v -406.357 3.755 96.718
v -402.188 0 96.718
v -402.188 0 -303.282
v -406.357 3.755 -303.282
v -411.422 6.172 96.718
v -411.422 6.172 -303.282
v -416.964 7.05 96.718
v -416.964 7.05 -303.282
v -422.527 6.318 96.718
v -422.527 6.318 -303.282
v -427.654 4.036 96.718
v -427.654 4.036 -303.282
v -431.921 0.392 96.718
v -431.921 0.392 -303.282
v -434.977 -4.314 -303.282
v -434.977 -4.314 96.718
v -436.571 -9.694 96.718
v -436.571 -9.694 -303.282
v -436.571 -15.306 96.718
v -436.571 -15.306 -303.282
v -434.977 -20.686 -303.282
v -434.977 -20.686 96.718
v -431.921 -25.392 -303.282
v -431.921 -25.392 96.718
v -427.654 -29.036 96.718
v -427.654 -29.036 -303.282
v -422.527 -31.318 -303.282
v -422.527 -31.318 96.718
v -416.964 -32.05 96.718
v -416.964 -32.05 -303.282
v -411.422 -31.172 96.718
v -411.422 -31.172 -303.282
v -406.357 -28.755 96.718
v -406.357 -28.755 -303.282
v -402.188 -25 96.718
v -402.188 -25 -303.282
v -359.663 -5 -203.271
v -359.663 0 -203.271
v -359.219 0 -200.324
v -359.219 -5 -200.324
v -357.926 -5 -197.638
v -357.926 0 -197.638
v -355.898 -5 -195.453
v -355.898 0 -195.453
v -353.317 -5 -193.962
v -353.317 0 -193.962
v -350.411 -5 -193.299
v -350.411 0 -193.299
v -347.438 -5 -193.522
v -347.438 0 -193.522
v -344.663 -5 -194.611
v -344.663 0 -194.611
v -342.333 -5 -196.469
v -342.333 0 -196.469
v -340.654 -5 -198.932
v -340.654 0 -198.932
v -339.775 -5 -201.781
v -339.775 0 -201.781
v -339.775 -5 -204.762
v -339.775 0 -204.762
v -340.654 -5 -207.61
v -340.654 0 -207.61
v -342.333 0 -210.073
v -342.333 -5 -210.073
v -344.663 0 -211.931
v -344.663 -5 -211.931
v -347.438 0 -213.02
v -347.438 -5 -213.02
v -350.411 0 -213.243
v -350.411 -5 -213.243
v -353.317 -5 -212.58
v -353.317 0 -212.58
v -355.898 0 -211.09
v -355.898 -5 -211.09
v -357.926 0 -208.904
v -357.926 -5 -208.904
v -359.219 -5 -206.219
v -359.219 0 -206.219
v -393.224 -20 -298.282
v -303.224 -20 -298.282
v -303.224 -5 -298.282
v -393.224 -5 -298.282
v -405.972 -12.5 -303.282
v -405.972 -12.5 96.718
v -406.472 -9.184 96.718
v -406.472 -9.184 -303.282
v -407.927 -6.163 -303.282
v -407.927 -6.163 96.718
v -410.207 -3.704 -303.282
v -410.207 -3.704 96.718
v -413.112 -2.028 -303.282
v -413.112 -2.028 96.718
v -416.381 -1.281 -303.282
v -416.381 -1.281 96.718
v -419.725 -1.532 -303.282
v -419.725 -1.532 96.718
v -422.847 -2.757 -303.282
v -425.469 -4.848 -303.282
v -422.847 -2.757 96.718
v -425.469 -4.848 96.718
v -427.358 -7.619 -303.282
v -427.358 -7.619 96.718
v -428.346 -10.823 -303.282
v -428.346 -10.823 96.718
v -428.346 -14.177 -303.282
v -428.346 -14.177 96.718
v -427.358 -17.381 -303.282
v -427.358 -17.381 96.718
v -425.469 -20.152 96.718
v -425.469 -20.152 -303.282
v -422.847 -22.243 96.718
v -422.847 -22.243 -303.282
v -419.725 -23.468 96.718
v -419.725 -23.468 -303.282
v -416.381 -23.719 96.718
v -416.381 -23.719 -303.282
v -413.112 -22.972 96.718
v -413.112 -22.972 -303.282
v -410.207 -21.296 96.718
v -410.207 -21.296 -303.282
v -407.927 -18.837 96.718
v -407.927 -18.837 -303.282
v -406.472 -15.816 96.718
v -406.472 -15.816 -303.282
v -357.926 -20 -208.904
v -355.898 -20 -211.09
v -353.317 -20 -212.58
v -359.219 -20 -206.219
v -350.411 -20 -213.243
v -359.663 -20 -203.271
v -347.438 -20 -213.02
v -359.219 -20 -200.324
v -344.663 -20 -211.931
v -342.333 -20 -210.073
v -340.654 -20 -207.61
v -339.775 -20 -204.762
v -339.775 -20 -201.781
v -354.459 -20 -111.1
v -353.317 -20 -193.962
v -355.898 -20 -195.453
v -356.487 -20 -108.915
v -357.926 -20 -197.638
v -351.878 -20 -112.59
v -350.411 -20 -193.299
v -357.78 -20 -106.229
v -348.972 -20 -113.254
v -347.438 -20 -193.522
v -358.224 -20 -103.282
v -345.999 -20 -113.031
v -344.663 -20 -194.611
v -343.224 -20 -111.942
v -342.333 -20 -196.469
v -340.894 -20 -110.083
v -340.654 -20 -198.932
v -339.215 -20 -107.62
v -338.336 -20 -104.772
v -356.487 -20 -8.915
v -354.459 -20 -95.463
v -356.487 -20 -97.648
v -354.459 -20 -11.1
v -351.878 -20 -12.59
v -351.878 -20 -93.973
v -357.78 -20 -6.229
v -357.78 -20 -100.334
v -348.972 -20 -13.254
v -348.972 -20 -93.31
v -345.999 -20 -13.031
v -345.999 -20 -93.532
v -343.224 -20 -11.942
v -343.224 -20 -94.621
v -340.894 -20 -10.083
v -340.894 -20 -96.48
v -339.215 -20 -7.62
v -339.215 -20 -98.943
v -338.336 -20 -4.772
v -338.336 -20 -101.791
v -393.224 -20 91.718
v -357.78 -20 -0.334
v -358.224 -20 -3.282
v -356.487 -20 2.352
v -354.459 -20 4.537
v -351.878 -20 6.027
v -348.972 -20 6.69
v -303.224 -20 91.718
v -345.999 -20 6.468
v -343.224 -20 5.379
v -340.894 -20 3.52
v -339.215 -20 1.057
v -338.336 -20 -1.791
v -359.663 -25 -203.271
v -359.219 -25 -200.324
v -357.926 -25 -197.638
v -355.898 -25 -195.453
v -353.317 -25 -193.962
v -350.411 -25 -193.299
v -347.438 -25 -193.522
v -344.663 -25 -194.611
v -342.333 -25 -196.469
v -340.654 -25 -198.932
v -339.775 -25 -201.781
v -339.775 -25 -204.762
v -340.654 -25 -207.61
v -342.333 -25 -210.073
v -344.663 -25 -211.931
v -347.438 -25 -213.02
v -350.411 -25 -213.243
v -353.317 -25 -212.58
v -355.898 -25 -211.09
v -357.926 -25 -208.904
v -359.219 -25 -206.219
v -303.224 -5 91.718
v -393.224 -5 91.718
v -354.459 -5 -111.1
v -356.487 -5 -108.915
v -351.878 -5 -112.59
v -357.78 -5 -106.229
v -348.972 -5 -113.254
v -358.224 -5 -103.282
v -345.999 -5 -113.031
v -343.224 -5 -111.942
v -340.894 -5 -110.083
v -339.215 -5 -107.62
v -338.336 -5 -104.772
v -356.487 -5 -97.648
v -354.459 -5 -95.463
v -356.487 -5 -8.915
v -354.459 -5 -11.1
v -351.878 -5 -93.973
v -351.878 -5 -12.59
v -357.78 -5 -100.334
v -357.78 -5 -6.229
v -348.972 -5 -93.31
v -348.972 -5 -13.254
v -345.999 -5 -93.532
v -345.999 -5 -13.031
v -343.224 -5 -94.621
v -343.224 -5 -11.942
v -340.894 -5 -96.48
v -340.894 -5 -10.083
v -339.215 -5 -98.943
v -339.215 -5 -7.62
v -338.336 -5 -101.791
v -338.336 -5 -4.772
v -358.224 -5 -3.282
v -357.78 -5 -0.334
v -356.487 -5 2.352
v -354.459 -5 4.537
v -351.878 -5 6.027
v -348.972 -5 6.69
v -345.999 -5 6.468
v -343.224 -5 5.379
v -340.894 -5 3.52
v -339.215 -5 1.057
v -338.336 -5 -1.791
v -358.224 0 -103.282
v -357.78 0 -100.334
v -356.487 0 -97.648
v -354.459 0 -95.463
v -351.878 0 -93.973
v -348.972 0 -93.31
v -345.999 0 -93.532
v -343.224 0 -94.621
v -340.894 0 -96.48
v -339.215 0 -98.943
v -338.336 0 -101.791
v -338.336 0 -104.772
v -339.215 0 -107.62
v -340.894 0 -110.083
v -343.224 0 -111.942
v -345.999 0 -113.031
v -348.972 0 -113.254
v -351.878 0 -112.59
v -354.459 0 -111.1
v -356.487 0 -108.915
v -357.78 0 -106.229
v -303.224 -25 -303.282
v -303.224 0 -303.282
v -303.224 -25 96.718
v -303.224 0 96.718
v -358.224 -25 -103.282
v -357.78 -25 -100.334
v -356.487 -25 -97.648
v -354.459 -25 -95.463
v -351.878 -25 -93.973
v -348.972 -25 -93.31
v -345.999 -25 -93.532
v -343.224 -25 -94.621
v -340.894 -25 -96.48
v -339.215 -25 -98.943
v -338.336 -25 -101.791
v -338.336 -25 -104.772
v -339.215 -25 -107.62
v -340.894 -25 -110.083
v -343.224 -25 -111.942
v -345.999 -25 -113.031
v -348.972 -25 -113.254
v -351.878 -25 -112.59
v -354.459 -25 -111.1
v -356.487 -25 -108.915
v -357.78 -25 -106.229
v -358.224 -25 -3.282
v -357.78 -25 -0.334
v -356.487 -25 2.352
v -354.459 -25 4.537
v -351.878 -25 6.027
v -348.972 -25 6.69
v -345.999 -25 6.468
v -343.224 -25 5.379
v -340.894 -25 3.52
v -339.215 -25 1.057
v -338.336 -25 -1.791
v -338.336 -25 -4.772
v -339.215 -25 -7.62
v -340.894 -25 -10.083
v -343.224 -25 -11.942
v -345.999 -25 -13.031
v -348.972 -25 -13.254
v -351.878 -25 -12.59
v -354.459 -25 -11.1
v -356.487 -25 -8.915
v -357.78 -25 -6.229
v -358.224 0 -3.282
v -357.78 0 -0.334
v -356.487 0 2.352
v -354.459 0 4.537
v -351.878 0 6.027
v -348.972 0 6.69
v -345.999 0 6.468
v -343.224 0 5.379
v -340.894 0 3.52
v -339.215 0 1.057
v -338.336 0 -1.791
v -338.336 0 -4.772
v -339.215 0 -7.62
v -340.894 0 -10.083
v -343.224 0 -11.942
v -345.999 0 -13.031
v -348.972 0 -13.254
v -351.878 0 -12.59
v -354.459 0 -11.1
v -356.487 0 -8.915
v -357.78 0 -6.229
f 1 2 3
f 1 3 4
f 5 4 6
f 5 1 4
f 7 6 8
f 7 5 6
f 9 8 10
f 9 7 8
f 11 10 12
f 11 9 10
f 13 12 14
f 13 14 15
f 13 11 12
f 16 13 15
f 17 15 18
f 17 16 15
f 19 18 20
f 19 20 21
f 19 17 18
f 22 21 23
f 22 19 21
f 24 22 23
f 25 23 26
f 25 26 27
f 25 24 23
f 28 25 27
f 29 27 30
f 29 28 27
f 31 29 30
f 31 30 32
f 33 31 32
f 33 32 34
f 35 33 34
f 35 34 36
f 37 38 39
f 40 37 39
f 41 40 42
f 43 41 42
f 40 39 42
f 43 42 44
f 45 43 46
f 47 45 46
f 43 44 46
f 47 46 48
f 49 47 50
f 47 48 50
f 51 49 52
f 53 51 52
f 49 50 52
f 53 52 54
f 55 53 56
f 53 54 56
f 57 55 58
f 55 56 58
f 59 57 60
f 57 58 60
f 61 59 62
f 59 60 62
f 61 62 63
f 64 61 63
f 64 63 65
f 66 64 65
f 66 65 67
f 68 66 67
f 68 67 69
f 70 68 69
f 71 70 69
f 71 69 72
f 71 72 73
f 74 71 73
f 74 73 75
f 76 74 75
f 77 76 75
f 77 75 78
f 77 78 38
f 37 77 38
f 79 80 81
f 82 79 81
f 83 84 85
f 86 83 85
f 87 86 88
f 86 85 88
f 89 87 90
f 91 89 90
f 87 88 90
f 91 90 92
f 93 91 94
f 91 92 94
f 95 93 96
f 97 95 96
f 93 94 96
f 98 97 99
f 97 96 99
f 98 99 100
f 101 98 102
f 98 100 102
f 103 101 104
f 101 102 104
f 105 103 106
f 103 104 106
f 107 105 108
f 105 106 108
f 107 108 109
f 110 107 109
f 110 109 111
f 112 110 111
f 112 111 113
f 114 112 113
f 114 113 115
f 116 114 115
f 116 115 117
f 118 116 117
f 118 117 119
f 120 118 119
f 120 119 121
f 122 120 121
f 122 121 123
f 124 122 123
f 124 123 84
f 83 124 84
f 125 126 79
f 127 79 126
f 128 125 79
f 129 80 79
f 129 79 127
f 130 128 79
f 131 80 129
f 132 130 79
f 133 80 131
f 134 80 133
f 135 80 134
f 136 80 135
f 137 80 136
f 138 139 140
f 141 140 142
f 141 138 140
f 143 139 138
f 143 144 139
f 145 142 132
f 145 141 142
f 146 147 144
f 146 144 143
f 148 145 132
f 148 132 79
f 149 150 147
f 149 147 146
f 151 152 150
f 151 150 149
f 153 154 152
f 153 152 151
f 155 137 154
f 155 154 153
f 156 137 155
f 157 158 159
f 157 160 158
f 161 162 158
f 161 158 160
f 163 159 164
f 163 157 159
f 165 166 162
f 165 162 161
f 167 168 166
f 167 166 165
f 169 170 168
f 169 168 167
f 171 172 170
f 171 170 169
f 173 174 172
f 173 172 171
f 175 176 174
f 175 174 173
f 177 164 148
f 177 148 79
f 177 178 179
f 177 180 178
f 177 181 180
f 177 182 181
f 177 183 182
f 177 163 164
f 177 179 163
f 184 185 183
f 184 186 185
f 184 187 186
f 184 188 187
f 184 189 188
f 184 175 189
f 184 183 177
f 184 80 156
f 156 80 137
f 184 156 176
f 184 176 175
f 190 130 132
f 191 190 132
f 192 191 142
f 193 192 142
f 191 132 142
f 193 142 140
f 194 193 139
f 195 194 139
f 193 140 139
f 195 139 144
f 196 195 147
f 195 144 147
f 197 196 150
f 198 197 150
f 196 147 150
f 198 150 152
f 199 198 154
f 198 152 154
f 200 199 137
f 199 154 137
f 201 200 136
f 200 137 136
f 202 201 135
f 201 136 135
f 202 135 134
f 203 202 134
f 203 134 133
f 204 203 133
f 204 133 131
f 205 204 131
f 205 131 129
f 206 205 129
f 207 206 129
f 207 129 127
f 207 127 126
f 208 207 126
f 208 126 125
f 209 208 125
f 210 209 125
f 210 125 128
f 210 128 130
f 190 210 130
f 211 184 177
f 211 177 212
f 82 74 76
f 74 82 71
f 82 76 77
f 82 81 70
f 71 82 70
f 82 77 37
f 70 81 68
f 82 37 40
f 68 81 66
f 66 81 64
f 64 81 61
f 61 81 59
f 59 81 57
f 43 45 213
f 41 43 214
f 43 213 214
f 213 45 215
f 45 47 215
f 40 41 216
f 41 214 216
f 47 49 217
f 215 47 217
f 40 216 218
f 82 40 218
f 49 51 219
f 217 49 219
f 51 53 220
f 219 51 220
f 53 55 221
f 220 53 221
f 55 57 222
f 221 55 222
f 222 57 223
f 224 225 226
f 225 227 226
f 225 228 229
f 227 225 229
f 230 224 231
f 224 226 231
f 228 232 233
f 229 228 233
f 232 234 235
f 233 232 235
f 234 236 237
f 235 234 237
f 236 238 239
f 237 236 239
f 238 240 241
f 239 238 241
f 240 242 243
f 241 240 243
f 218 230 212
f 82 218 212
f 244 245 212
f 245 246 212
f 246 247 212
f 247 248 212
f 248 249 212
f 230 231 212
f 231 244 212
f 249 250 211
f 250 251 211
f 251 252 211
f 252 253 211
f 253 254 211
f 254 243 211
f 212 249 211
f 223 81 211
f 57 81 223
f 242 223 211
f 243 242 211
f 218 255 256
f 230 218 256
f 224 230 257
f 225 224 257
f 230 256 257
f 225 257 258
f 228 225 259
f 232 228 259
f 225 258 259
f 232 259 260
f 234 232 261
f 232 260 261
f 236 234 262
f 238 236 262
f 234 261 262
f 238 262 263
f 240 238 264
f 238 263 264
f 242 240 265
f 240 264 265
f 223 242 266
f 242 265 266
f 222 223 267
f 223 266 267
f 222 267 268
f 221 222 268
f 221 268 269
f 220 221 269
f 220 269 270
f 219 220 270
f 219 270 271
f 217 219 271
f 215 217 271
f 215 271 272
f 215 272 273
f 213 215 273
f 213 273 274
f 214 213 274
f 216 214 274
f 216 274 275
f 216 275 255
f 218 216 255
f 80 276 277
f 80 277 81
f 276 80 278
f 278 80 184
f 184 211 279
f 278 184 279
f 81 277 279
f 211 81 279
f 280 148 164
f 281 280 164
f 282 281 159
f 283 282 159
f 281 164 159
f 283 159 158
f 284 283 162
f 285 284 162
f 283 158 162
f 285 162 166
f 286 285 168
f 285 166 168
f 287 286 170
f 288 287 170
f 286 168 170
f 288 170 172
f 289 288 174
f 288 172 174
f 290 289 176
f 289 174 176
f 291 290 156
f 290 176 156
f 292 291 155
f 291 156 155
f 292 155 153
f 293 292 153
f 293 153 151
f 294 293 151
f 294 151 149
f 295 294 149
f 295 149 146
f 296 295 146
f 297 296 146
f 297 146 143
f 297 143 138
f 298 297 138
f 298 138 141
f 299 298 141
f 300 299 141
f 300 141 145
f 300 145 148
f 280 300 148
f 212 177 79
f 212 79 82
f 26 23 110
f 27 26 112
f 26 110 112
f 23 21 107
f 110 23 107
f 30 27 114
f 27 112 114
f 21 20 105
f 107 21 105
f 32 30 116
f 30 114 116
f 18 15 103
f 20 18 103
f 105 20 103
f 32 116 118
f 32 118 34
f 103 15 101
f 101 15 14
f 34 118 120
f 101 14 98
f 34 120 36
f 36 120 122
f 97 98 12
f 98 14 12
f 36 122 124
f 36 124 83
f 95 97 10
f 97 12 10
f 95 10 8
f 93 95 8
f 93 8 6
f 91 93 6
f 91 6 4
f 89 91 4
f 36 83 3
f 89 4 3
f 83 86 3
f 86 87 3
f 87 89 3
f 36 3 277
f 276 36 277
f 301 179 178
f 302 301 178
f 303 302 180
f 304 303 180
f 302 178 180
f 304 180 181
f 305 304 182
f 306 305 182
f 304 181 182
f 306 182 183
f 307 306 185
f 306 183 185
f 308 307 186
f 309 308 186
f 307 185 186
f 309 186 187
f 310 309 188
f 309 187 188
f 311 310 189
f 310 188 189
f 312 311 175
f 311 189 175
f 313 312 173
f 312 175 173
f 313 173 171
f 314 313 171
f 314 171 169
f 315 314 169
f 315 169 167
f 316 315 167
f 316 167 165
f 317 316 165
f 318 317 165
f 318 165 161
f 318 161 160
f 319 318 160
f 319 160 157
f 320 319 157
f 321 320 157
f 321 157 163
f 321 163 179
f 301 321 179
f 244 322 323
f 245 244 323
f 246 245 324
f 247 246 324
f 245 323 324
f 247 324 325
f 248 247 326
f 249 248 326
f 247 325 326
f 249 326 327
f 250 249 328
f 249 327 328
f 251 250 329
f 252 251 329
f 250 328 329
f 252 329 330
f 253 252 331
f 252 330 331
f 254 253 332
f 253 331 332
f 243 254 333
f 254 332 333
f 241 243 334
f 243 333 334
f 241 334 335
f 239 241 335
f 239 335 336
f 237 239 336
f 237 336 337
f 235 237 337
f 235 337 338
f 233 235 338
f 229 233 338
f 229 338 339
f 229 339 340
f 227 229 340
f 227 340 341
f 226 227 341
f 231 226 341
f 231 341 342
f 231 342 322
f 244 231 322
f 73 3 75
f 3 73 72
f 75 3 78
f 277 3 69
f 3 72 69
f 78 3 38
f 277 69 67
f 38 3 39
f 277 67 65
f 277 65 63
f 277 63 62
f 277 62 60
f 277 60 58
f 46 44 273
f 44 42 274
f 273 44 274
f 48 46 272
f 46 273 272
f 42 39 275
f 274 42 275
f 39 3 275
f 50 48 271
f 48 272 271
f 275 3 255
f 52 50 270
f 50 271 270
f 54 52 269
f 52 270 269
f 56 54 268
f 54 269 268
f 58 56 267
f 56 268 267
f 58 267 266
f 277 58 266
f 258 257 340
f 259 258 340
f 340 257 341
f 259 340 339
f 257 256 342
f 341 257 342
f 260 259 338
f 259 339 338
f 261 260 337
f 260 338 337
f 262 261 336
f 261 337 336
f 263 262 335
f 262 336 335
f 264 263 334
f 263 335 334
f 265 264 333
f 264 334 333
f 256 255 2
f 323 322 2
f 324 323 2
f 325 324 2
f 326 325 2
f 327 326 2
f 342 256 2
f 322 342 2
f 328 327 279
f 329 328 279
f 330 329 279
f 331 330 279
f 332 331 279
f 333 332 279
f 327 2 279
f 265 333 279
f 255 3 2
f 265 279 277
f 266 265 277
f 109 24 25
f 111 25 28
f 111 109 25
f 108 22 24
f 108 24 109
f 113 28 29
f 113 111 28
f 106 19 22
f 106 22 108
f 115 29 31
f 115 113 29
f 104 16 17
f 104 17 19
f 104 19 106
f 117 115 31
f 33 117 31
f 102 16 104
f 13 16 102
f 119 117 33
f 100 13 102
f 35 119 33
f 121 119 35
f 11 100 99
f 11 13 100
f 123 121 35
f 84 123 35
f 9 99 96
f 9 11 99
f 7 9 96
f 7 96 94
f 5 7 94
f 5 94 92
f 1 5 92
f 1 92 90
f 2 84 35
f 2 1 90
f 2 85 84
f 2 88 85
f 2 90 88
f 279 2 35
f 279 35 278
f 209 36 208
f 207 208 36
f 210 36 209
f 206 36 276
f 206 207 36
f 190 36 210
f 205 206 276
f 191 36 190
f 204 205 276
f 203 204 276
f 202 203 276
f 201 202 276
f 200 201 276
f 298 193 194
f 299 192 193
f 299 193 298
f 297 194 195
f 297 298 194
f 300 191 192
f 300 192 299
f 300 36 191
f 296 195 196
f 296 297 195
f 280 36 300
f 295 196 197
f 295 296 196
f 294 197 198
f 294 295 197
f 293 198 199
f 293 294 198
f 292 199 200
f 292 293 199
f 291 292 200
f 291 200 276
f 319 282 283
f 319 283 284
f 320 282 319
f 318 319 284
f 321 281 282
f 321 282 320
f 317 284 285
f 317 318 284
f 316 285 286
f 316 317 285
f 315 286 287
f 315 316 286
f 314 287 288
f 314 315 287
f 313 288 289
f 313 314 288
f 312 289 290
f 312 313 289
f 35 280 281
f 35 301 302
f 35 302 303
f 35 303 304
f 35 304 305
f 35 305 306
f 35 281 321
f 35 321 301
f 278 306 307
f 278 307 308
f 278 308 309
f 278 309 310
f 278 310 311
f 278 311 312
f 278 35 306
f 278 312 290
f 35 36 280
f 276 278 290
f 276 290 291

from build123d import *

# Parameters (mm, degrees)
F0_W     = 100
F0_H     = 400
F1_DEPTH = 25
F2_W     = 15
F2_H     = 390
F3_DEPTH = 90
F4_R     = 10
F5_DEPTH = 1000
F7_DEPTH = 400
F8_R     = 11.25
F9_DEPTH = 500


with BuildPart() as f1:
    # F0 (on Front) → F1 (new body)
    with BuildSketch(Plane.XZ):
        with Locations((-353.224424, -103.281556)):
            Rectangle(F0_W, F0_H)
    extrude(amount=F1_DEPTH)

    # F2 (on face) → F3 (cut)
    with BuildSketch(Plane.YZ.offset(-303.224424)):
        with Locations((-12.5, -103.281556)):
            Rectangle(F2_W, F2_H)
    extrude(amount=-F3_DEPTH, mode=Mode.SUBTRACT)

    # F4 (on face) → F5 (cut)
    with BuildSketch(Plane(origin=(0, 0, 0), x_dir=(-1, 0, 0), z_dir=(0, 1, 0))):
        with Locations((348.224424, -3.281556)):
            Circle(F4_R)
        with Locations((348.224424, -103.281556)):
            Circle(F4_R)
        with Locations((349.663308, -203.271204)):
            Circle(F4_R)
    extrude(amount=-F5_DEPTH, mode=Mode.SUBTRACT)

    # F6 (on face) → F7 (join)
    with BuildSketch(Plane.XY.offset(96.718444)):
        with BuildLine():
            Line((-403.224424, 0), (-402.187852, 0))
            ThreePointArc((-402.187852, 0), (-436.77333, -12.5), (-402.187852, -25))
            Line((-402.187852, -25), (-403.224424, -25))
            Line((-403.224424, -25), (-403.224424, 0))
        make_face()
        with BuildLine():
            ThreePointArc((-402.187852, -25), (-398.834163, -19.145684), (-397.67006, -12.5))
            ThreePointArc((-397.67006, -12.5), (-398.834163, -5.854316), (-402.187852, 0))
            Line((-402.187852, 0), (-403.224424, 0))
            Line((-403.224424, 0), (-403.224424, -25))
            Line((-403.224424, -25), (-402.187852, -25))
        make_face()
    extrude(amount=-F7_DEPTH)

    # F8 (on face) → F9 (cut)
    with BuildSketch(Plane.XY.offset(96.718444)):
        with Locations((-417.221695, -12.5)):
            Circle(F8_R)
    extrude(amount=-F9_DEPTH, mode=Mode.SUBTRACT)


solid = f1.part
